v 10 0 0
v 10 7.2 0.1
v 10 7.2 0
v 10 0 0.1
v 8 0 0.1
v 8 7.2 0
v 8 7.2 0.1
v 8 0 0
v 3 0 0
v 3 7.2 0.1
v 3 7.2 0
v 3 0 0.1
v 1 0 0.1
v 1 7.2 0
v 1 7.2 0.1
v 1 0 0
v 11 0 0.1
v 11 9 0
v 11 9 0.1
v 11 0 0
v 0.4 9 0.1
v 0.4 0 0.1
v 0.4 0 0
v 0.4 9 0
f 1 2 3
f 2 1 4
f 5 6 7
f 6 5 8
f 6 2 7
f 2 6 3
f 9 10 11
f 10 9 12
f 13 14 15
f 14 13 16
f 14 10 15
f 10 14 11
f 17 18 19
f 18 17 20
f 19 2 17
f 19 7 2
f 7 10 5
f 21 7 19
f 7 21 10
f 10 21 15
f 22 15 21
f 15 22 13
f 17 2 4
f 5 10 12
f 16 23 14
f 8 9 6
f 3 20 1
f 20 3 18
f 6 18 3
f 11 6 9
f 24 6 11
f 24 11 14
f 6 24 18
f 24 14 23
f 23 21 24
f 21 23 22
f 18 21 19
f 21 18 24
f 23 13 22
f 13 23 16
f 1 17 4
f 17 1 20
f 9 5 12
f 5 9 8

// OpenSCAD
// usb a pinout: vcc, d-, d+, gnd
isolate_pins = [ 0, 1, 1, 0 ];
isolator_thickness = 0.1;
tolerance = 0.4;

{
    usb_a_male_outter_dimensions =  [ 12, 12, 4.5 ];
    usb_a_metal_casing_thickness = 0.3;
    usb_a_pin_offsets = [ 9, 6.5, 4.5, 2 ];
    usb_a_pin_width = 1;

    isolator_pin_depth = usb_a_male_outter_dimensions[1] - 3;
    groove_width = usb_a_pin_width * 2;

    difference() {
        translate([tolerance,0,0])
            cube([usb_a_male_outter_dimensions[0] - 2*usb_a_metal_casing_thickness - 2*tolerance, isolator_pin_depth, isolator_thickness]);
        for (pin = [0:len(isolate_pins) - 1]) {
            if (isolate_pins[pin] == 0) {
                translate([usb_a_pin_offsets[pin] - groove_width/2, -1, -isolator_thickness])
                    cube([groove_width, isolator_pin_depth * 0.8 + 1 , 3 * isolator_thickness]);
            }
        }
    }
}
